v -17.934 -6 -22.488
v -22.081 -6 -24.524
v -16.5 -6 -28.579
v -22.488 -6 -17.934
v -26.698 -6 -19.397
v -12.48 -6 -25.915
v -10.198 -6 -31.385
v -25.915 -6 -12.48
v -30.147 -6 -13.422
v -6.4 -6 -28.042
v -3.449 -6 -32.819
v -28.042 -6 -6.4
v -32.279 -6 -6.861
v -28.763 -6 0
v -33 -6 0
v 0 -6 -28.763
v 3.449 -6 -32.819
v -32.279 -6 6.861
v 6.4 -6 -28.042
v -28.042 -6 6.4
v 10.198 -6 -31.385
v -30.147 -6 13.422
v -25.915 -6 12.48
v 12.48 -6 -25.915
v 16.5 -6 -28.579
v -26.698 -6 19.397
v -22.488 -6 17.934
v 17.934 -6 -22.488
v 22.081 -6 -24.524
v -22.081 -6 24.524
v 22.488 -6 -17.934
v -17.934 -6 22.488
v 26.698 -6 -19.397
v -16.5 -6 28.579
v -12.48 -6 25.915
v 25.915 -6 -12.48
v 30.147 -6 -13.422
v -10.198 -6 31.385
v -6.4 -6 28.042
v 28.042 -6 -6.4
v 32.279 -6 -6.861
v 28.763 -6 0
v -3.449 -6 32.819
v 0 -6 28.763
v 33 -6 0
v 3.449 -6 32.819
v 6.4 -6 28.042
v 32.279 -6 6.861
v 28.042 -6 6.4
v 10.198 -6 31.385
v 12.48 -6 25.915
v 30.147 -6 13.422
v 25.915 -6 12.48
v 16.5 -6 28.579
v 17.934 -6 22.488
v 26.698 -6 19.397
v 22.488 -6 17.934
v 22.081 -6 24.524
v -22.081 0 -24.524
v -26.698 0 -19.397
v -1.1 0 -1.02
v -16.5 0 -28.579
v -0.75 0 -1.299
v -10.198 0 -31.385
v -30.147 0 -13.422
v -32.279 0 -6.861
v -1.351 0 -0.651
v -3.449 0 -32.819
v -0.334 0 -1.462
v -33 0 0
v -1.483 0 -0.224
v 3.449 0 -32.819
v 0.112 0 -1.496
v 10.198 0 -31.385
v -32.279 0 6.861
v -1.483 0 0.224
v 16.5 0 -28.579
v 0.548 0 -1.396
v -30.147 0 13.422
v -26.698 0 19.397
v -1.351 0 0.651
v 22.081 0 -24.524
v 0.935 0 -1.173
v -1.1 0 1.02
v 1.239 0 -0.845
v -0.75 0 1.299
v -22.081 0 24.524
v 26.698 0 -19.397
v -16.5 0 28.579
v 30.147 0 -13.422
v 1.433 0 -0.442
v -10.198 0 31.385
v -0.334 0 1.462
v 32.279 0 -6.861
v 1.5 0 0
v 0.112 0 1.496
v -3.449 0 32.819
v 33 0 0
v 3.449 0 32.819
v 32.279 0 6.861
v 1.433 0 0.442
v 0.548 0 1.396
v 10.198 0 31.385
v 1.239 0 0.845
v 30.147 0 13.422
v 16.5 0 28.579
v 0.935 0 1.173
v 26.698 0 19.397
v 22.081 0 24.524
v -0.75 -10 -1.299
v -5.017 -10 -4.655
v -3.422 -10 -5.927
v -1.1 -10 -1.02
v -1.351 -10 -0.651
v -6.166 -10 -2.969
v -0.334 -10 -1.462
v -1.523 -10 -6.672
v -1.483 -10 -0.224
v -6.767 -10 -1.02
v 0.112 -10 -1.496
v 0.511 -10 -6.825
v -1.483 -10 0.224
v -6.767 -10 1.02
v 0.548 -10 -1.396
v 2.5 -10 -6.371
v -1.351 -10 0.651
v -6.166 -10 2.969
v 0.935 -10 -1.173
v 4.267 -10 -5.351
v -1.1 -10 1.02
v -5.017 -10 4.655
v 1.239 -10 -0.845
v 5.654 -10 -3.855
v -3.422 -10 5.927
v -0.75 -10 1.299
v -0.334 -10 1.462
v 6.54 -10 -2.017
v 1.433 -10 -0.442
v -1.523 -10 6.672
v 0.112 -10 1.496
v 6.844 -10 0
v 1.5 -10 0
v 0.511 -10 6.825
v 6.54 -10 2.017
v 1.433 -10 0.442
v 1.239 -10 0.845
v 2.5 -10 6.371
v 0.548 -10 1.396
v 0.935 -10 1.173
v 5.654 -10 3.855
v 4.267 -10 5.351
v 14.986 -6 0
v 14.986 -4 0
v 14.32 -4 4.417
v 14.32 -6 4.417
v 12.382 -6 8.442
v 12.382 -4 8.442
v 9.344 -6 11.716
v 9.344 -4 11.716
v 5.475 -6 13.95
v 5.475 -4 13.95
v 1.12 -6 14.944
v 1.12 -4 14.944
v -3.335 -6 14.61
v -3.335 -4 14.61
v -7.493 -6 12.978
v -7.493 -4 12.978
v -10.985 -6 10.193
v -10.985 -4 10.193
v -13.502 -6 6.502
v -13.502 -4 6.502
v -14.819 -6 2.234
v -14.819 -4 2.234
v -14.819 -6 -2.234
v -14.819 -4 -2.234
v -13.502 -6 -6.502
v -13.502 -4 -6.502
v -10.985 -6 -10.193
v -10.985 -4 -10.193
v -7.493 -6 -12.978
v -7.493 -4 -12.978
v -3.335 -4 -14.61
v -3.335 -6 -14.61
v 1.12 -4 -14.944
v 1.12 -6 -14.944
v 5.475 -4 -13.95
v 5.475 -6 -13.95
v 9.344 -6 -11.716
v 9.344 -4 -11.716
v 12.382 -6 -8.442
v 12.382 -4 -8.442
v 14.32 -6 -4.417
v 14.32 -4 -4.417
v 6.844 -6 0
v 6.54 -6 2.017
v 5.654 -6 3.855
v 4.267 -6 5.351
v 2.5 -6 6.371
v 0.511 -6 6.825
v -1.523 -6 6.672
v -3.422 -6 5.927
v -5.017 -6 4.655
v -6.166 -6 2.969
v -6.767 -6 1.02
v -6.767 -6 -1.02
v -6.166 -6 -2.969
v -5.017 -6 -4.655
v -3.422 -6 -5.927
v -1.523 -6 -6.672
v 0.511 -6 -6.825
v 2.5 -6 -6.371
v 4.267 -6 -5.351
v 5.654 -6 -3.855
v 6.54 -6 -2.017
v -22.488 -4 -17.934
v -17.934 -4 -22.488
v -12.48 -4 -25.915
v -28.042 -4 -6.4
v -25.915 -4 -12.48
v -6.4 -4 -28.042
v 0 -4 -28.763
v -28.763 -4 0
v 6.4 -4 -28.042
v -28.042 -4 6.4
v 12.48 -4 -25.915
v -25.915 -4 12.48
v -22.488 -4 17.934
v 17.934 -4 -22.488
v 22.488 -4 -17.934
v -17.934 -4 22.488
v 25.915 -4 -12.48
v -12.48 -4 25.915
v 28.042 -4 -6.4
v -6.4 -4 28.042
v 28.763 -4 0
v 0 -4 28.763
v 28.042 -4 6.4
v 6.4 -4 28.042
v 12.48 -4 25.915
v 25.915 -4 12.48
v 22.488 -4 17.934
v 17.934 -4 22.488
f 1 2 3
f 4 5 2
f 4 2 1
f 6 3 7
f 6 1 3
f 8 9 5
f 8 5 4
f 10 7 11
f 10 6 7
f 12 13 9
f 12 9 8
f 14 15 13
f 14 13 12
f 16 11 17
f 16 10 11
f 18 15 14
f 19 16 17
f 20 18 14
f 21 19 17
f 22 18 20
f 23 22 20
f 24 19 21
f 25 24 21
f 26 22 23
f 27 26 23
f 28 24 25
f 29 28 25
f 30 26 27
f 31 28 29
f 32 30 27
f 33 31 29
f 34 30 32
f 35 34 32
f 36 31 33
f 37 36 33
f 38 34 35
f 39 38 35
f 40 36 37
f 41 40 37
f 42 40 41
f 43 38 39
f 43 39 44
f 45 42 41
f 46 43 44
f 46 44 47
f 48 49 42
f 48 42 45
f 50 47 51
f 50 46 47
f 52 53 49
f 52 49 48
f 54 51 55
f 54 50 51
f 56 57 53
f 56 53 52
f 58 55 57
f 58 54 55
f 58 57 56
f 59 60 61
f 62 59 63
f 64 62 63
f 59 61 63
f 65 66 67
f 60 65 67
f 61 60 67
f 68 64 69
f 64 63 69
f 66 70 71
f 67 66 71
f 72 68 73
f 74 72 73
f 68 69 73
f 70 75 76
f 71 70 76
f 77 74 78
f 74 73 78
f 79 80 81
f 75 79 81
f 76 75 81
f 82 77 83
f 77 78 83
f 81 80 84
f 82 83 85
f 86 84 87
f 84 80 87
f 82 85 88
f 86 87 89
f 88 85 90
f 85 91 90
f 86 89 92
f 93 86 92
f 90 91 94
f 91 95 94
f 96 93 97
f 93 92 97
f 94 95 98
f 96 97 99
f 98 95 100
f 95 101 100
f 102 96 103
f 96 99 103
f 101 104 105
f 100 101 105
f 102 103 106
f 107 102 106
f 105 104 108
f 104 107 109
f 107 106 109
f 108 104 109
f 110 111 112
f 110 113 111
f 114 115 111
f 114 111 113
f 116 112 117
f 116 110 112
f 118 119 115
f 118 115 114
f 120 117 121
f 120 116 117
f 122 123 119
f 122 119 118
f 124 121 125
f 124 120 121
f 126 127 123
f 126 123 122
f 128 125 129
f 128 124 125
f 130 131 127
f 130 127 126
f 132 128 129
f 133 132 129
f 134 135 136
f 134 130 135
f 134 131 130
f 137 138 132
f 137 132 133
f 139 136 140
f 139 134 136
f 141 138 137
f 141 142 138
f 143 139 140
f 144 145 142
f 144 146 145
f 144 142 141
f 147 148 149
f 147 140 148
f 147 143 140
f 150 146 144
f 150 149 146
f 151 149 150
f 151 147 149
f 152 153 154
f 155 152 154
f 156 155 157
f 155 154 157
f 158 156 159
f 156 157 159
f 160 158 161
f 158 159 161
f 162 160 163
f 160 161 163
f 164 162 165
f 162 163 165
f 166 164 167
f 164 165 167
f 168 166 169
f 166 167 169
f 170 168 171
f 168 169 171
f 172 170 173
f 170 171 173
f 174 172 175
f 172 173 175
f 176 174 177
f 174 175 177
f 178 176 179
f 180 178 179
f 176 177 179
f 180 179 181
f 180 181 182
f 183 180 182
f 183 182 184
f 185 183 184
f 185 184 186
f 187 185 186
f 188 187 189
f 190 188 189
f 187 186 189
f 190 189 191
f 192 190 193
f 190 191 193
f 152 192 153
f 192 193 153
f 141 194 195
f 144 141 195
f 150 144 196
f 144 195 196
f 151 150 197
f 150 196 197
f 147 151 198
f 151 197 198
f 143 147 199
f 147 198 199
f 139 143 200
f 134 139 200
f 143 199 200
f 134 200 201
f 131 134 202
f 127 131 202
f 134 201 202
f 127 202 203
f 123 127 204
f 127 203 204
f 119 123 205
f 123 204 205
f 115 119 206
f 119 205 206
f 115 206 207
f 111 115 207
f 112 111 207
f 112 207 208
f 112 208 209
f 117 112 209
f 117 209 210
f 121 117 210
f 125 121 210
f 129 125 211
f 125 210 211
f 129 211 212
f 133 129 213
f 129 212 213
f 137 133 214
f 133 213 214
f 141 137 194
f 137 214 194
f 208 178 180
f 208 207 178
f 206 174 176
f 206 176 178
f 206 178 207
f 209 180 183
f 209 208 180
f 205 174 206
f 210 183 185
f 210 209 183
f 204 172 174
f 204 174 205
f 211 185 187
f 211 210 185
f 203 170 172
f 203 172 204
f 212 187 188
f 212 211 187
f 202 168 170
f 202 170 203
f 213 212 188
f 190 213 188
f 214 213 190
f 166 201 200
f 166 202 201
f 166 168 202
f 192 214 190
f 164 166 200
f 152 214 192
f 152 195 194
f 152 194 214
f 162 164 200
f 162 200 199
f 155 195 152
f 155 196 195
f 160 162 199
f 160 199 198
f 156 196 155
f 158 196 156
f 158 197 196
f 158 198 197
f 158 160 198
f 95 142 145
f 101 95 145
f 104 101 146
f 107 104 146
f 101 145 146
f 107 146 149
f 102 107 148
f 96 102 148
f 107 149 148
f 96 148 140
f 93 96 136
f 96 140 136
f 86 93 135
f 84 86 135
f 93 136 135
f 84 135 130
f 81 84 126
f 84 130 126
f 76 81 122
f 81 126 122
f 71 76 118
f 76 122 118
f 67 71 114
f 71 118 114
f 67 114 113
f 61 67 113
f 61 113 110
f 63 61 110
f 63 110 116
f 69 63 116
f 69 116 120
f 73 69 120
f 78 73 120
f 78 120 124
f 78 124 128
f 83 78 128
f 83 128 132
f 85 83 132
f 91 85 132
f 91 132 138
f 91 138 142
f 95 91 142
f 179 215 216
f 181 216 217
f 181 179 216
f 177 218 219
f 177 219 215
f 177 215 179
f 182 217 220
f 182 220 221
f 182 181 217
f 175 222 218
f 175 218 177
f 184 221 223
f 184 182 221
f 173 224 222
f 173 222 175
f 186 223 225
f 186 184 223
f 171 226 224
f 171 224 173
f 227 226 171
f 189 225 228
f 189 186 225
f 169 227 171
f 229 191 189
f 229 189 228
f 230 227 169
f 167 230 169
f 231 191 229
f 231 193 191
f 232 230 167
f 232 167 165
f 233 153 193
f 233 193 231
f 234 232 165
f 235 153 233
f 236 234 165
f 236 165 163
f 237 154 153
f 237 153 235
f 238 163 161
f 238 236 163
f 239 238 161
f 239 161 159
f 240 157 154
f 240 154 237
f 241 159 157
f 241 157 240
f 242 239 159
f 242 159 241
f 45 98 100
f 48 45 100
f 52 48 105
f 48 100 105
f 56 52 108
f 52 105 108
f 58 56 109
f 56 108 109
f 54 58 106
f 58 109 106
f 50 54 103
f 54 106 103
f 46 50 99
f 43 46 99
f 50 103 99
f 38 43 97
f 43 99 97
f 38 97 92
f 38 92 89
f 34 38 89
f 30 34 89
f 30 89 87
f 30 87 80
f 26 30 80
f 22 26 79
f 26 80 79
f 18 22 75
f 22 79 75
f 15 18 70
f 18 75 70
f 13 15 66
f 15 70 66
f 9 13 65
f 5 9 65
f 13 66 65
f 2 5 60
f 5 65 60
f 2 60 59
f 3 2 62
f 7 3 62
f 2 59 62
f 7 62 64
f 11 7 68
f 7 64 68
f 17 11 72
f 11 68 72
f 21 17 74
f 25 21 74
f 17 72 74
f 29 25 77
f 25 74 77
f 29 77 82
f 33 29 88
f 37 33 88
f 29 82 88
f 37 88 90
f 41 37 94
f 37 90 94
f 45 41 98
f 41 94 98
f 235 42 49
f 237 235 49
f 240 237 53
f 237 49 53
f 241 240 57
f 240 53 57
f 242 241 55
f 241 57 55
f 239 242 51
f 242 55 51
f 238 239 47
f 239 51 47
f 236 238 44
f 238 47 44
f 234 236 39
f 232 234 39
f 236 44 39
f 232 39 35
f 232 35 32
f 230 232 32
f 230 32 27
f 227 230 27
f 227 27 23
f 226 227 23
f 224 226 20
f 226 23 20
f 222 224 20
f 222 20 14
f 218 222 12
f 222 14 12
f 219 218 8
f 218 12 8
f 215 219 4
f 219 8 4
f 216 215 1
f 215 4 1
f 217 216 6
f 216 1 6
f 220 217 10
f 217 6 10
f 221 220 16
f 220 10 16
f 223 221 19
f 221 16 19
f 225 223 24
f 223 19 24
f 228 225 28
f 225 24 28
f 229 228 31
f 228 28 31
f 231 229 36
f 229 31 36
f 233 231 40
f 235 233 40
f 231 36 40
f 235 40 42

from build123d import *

# Parameters (mm, degrees)
F0_R     = 33
F1_DEPTH = 6
F2_R     = 28.763366
F3_DEPTH = 2
F4_R     = 14.9859
F5_DEPTH = 2
F6_R     = 6.84366
F7_DEPTH = 4
F8_R     = 1.5
F9_DEPTH = 25


with BuildPart() as f1:
    # F0 (on Front) → F1 (new body)
    with BuildSketch(Plane.XZ):
        Circle(F0_R)
    extrude(amount=F1_DEPTH)

    # F2 (on face) → F3 (cut)
    with BuildSketch(Plane.XZ.offset(6)):
        Circle(F2_R)
    extrude(amount=-F3_DEPTH, mode=Mode.SUBTRACT)

    # F4 (on face) → F5 (join)
    with BuildSketch(Plane.XZ.offset(4)):
        Circle(F4_R)
    extrude(amount=F5_DEPTH)

    # F6 (on face) → F7 (join)
    with BuildSketch(Plane.XZ.offset(6)):
        Circle(F6_R)
    extrude(amount=F7_DEPTH)

    # F8 (on face) → F9 (cut)
    with BuildSketch(Plane.XZ.offset(10)):
        Circle(F8_R)
    extrude(amount=-F9_DEPTH, mode=Mode.SUBTRACT)


solid = f1.part
